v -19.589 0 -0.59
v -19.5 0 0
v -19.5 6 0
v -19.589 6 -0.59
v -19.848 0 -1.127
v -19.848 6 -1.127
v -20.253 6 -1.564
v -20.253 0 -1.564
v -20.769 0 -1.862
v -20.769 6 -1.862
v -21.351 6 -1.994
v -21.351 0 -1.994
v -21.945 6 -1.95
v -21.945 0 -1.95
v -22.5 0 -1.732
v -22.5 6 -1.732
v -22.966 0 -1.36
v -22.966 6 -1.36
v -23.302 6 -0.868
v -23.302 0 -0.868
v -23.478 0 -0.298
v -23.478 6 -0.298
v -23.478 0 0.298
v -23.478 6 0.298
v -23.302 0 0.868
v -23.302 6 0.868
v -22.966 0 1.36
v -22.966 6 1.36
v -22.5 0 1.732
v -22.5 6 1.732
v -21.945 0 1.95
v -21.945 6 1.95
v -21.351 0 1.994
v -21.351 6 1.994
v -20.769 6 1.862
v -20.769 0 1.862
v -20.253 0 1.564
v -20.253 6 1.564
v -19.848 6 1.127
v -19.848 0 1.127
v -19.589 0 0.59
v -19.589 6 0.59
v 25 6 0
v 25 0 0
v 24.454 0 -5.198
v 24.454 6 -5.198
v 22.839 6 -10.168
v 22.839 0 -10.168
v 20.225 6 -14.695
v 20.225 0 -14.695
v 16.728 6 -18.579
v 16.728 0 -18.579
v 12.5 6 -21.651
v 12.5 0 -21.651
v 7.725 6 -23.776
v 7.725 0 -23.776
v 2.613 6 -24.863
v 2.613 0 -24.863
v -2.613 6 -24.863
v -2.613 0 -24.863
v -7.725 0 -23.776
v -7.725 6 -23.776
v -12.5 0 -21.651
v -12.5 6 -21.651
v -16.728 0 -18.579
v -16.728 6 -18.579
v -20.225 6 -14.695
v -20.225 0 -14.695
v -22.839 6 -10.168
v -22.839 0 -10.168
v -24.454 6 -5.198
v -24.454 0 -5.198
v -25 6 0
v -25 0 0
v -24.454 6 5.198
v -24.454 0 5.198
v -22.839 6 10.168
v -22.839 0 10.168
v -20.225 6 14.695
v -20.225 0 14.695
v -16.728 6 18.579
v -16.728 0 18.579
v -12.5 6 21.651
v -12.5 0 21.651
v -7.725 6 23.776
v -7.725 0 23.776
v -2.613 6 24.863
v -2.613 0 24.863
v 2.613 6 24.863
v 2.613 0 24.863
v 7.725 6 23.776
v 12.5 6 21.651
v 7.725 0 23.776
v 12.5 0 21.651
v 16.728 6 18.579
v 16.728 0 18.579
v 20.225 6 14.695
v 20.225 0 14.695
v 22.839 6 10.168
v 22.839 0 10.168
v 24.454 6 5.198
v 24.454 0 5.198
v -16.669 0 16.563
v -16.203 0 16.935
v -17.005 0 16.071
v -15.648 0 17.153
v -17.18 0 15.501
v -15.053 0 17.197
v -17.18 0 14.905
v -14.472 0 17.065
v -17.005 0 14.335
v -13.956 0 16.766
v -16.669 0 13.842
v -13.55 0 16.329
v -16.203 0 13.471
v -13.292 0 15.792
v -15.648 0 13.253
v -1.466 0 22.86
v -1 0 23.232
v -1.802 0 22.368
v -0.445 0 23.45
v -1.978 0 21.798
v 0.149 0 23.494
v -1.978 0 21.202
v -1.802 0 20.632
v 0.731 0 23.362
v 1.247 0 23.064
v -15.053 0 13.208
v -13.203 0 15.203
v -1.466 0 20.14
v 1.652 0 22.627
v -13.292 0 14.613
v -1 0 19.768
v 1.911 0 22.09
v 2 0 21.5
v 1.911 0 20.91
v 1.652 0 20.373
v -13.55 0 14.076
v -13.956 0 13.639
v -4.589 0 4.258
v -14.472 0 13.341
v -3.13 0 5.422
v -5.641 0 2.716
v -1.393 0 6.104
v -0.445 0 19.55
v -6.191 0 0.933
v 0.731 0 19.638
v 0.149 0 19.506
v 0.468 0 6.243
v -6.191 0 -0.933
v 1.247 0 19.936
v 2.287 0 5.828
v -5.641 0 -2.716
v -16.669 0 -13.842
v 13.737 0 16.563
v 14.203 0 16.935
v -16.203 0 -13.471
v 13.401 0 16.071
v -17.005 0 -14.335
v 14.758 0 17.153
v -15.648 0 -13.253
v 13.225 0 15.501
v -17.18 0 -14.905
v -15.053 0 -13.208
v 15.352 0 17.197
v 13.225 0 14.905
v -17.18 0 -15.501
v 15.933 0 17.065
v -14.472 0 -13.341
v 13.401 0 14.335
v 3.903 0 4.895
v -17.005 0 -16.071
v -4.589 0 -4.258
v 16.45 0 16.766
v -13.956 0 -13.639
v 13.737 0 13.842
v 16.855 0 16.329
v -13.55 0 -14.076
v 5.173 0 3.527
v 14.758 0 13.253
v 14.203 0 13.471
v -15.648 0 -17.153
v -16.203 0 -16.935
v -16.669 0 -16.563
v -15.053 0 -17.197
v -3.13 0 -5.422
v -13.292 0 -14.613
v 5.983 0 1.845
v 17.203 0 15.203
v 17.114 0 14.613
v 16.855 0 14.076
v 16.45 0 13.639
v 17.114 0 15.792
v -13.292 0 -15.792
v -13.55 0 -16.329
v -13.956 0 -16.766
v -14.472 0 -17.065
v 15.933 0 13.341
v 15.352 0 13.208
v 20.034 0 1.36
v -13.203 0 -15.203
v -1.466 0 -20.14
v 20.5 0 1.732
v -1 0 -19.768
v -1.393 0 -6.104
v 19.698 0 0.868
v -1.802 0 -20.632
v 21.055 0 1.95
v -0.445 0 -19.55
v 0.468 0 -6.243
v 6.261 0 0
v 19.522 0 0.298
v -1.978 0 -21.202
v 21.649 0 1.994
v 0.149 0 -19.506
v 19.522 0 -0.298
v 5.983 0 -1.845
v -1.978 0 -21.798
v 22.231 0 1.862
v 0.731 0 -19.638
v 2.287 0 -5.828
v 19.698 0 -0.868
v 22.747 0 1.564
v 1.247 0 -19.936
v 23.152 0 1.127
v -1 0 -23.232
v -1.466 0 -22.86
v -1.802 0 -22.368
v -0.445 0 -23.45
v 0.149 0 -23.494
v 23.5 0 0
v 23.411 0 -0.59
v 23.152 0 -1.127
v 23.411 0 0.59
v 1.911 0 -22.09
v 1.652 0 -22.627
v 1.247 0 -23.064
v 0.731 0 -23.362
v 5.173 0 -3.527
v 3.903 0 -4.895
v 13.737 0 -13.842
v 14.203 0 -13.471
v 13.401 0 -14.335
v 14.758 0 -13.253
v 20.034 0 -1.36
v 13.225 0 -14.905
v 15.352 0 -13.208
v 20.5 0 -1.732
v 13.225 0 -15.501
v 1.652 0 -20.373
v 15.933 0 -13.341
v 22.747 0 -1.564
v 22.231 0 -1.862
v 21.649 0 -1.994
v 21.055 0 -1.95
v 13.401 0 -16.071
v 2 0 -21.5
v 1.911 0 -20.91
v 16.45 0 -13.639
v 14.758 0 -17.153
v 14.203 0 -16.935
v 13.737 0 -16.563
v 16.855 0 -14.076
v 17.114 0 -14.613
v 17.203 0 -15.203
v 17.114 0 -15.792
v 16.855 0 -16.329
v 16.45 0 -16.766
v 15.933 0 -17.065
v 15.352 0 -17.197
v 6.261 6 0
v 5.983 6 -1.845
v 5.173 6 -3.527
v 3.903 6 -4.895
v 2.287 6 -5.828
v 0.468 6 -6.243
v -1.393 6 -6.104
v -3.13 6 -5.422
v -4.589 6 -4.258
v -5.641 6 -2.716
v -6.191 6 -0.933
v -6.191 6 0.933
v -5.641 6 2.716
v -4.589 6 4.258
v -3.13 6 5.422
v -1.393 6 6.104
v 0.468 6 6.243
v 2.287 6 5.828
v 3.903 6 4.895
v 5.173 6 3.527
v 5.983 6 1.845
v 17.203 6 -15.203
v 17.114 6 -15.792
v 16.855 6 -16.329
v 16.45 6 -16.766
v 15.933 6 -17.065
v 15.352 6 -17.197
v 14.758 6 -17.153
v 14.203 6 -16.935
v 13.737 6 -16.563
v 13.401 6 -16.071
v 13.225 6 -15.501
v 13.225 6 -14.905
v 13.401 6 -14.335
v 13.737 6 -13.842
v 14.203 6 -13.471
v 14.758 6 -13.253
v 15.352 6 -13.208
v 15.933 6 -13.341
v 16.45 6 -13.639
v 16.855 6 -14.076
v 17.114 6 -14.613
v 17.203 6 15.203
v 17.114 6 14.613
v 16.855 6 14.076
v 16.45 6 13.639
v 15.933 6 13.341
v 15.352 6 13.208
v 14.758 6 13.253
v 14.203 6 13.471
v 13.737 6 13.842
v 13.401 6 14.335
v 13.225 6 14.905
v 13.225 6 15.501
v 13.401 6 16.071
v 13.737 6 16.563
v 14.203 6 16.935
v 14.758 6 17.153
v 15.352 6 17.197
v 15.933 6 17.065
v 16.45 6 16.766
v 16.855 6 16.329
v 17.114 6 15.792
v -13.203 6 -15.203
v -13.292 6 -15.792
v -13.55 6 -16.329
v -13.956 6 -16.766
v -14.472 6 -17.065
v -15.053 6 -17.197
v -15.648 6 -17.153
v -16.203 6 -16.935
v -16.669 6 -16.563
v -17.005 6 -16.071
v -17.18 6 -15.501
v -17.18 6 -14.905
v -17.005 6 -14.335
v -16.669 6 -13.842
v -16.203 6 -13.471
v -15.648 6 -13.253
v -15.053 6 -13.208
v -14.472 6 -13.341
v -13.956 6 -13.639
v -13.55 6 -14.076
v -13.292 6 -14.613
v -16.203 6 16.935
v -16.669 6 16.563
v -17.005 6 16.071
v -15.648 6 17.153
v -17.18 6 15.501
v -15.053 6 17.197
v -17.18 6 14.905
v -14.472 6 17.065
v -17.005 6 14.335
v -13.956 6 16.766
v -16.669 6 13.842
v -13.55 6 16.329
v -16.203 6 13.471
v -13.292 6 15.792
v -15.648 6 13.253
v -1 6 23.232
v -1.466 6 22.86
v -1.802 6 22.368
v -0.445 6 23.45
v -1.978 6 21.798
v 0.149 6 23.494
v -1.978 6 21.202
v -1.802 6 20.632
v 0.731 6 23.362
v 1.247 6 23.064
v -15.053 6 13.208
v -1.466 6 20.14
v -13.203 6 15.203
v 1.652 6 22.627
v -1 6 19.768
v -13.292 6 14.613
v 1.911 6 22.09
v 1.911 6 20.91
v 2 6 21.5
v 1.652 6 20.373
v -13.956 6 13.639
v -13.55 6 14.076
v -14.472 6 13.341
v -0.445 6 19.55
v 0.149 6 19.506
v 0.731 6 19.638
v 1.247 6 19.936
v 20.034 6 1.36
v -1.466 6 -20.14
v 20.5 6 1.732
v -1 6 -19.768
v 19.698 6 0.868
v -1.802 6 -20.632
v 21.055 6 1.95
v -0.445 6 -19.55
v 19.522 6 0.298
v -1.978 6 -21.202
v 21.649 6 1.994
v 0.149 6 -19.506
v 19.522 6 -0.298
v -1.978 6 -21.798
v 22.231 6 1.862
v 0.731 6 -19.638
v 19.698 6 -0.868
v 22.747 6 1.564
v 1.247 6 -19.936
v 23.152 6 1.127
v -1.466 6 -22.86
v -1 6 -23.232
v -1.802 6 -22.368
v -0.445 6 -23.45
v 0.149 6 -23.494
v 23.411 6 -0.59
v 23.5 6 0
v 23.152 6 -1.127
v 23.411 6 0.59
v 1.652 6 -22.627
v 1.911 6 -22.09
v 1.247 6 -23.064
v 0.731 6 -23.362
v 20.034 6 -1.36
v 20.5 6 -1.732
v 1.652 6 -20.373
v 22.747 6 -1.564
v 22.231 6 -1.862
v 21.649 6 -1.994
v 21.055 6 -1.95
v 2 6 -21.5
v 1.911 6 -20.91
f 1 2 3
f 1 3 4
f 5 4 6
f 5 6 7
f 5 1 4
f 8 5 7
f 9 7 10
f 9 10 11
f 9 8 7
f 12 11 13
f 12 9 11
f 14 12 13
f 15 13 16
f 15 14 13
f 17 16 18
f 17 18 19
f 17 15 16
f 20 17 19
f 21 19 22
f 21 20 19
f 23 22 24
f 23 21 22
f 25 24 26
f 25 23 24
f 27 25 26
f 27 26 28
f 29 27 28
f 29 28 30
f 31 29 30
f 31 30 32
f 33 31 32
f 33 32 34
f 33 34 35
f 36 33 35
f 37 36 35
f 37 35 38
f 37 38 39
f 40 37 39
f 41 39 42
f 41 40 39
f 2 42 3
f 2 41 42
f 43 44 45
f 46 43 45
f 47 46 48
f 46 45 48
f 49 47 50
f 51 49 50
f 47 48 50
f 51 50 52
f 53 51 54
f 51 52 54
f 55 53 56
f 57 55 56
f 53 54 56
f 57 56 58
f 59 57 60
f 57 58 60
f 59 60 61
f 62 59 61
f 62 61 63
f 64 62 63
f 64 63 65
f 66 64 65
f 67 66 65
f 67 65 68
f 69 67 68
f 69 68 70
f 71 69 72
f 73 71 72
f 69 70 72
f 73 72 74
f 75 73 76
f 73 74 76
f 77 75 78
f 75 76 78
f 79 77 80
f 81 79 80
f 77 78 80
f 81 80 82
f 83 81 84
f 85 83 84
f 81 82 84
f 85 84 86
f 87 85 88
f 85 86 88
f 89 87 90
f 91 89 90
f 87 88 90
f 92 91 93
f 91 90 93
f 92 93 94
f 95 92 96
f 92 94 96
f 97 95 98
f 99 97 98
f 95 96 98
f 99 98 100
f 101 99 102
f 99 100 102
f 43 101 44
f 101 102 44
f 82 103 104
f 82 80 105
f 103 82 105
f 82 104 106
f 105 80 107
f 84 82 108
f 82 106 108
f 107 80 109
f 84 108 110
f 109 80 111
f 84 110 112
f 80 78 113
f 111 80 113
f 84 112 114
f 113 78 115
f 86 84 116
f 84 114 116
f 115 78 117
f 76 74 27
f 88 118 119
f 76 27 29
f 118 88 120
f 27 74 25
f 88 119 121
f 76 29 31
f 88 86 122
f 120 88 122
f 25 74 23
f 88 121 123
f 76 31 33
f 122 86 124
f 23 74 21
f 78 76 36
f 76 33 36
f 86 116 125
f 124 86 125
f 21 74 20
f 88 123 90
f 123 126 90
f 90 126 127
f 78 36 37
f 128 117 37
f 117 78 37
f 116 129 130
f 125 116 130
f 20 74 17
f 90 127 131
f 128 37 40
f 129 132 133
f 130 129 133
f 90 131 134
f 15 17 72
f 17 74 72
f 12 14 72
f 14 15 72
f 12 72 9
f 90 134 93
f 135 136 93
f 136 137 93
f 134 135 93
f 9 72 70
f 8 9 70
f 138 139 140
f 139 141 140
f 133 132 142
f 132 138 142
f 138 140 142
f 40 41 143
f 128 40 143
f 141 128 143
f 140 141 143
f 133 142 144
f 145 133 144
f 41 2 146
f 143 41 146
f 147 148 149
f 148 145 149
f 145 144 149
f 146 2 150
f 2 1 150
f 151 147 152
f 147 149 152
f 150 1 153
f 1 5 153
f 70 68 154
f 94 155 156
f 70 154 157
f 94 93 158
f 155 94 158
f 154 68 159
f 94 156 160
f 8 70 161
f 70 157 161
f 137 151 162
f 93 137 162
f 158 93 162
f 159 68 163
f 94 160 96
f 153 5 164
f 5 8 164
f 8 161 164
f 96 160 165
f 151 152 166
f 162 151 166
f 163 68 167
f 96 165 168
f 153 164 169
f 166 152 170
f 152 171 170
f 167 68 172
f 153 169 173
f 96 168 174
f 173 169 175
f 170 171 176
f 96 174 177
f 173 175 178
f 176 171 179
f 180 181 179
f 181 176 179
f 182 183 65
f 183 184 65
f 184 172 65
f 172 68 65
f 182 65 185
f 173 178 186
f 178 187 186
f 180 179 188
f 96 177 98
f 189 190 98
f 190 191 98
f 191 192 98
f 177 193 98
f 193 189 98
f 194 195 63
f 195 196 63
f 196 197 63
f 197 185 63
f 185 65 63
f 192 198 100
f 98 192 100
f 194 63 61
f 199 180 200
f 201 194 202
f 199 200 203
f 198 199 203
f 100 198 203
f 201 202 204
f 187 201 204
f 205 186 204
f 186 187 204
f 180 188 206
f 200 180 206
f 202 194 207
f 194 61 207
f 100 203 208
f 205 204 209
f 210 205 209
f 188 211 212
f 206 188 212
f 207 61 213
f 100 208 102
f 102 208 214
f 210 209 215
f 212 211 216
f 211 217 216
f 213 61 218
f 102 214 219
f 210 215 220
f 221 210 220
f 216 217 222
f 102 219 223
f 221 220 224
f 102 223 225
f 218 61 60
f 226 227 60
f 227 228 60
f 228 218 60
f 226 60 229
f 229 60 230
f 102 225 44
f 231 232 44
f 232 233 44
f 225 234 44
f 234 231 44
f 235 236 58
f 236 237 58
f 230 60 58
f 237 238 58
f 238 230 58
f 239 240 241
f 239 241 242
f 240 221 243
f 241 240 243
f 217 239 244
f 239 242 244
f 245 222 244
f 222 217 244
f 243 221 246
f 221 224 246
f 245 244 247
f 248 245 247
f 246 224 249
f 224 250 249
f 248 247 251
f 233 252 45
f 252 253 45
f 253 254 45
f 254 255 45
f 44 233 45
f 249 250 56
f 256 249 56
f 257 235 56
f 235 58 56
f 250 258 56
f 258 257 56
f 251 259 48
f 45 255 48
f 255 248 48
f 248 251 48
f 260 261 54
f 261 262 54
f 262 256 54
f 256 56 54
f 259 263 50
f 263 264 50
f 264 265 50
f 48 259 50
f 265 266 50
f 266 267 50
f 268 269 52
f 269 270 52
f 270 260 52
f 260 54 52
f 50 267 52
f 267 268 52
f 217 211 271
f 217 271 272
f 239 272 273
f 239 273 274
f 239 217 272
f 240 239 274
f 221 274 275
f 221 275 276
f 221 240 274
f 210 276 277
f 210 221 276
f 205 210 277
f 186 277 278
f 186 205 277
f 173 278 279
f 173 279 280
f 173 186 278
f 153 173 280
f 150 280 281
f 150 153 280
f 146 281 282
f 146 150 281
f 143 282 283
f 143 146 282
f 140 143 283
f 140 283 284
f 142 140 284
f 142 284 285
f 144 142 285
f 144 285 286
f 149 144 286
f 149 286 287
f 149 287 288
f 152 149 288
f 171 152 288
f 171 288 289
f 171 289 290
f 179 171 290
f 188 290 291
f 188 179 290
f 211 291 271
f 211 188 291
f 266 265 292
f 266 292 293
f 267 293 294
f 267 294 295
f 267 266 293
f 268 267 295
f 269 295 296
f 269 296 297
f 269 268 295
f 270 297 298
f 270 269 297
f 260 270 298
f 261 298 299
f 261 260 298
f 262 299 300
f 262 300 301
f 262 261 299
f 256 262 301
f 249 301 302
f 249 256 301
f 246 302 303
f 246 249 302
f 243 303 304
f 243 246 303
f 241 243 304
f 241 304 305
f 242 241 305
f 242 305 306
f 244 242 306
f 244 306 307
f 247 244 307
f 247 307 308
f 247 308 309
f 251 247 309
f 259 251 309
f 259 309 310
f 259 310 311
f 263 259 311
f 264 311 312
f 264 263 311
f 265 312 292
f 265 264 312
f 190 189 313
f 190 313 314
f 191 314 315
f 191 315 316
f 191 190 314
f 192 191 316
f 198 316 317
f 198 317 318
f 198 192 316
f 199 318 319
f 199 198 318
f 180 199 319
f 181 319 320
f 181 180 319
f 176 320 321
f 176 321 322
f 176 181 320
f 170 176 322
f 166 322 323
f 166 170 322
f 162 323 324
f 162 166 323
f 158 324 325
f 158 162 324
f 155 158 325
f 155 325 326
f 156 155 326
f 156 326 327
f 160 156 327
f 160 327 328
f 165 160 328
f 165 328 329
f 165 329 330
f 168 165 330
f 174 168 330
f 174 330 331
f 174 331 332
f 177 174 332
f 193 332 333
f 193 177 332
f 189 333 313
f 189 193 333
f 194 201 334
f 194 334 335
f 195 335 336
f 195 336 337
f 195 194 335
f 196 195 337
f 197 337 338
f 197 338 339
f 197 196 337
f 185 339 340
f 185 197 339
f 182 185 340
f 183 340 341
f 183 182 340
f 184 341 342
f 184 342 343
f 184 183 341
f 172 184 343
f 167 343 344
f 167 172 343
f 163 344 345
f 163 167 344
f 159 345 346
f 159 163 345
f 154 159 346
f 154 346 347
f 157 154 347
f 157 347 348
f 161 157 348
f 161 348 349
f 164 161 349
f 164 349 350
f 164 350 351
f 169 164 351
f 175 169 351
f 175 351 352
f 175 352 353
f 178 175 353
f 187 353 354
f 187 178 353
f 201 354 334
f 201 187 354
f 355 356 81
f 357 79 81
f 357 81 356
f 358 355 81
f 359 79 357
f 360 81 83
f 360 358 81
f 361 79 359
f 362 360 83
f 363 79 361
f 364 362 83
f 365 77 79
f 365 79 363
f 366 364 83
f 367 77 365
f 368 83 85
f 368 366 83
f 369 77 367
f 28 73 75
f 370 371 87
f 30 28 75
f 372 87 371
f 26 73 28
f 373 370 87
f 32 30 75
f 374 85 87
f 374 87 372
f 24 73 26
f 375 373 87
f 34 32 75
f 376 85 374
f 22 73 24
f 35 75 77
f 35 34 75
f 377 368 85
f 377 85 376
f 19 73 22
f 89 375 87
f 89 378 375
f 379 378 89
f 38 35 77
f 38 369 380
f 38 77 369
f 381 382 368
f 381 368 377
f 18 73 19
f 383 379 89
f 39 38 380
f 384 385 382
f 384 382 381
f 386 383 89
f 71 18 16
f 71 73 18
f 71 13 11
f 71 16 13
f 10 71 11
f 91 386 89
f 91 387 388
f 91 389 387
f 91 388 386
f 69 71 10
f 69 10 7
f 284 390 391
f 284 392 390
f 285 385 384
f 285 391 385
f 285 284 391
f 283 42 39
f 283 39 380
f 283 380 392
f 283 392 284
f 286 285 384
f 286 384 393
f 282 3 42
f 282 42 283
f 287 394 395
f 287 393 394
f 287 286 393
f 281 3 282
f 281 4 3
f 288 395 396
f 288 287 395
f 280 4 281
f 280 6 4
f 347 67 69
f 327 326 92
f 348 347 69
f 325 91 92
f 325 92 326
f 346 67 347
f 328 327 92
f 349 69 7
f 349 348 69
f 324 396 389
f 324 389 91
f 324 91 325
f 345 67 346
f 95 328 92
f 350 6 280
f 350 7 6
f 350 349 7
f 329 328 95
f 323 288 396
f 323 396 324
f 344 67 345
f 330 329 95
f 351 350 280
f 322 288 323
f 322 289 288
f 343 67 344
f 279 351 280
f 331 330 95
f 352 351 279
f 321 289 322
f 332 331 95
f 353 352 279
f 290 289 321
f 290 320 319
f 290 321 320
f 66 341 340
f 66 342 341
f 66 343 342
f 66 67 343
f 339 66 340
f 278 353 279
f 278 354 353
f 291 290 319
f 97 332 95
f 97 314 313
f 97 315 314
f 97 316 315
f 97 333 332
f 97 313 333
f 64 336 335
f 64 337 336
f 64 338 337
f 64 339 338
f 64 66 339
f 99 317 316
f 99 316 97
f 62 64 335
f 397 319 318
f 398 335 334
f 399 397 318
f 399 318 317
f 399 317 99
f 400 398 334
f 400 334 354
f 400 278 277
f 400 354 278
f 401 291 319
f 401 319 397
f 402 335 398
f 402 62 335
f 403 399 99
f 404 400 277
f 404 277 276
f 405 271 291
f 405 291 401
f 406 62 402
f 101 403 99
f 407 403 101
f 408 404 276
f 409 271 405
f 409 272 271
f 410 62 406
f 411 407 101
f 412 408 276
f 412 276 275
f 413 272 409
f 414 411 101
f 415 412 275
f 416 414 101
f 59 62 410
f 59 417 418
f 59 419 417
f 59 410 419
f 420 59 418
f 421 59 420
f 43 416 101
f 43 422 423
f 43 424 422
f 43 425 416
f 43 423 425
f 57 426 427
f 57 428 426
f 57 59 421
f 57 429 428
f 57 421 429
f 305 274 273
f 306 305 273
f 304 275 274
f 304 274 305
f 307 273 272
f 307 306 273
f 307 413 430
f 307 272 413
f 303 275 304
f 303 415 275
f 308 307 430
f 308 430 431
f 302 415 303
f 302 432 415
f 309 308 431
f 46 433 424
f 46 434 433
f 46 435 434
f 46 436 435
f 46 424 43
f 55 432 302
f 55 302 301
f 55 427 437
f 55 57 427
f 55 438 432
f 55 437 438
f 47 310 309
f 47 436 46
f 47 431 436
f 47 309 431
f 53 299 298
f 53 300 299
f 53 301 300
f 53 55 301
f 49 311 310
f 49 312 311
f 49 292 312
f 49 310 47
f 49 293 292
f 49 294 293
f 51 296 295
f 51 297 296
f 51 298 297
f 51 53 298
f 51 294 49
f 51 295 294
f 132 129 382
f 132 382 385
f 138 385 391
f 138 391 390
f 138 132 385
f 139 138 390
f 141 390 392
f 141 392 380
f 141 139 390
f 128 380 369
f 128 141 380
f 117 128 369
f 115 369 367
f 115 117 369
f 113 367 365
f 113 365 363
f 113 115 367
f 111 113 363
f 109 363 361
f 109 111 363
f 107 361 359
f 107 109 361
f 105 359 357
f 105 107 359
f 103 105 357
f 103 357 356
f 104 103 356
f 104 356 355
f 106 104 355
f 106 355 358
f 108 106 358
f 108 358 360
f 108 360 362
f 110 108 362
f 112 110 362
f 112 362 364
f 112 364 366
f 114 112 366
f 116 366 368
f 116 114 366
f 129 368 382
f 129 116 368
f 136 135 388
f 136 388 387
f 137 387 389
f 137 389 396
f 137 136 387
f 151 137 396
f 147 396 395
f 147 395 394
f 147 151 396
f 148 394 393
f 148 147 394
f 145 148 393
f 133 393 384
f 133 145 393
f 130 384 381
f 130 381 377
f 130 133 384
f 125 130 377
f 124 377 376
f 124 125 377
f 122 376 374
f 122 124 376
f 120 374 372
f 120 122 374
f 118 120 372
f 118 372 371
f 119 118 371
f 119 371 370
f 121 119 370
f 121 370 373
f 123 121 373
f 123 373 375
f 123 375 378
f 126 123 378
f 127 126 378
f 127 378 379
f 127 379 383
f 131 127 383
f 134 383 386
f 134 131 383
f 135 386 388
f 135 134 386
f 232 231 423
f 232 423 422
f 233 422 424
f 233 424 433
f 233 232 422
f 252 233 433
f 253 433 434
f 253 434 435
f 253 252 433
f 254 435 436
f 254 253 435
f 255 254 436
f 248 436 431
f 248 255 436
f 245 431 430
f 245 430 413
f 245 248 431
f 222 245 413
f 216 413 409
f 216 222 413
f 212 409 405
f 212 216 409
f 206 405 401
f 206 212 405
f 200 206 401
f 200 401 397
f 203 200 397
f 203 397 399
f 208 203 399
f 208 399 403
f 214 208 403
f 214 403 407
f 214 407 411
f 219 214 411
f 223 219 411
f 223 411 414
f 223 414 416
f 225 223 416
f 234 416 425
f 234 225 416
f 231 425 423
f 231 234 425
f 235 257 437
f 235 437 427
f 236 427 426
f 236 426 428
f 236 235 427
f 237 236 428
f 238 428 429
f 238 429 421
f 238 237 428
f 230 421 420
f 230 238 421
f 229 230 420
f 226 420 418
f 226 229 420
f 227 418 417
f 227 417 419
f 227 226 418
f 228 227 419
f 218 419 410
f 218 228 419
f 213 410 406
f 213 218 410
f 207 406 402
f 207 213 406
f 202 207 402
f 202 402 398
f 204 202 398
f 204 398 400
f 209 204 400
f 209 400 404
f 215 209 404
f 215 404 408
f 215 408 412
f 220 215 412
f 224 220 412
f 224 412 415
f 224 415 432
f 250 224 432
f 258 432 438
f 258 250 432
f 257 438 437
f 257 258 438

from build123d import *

# Parameters (mm, degrees)
SKETCH_1_R      = 25
SKETCH_1_R_2    = 2
SKETCH_1_R_3    = 6.260668566
EXTRUDE_1_DEPTH = 6


with BuildPart() as part:
    # 草图1 → 凸台-拉伸1 (new body)
    with BuildSketch(Plane(origin=(0, 0, 0), x_dir=(1, 0, 0), z_dir=(0, 1, 0))):
        Circle(SKETCH_1_R)
        with Locations((0, 21.5)):
            Circle(SKETCH_1_R_2, mode=Mode.SUBTRACT)
        with Locations((15.202795796, 15.202795796)):
            Circle(SKETCH_1_R_2, mode=Mode.SUBTRACT)
        with Locations((21.5, 0)):
            Circle(SKETCH_1_R_2, mode=Mode.SUBTRACT)
        with Locations((15.202795796, -15.202795796)):
            Circle(SKETCH_1_R_2, mode=Mode.SUBTRACT)
        with Locations((0, -21.5)):
            Circle(SKETCH_1_R_2, mode=Mode.SUBTRACT)
        with Locations((-15.202795796, -15.202795796)):
            Circle(SKETCH_1_R_2, mode=Mode.SUBTRACT)
        with Locations((-21.5, 0)):
            Circle(SKETCH_1_R_2, mode=Mode.SUBTRACT)
        with Locations((-15.202795796, 15.202795796)):
            Circle(SKETCH_1_R_2, mode=Mode.SUBTRACT)
        Circle(SKETCH_1_R_3, mode=Mode.SUBTRACT)
    extrude(amount=EXTRUDE_1_DEPTH)


solid = part.part
